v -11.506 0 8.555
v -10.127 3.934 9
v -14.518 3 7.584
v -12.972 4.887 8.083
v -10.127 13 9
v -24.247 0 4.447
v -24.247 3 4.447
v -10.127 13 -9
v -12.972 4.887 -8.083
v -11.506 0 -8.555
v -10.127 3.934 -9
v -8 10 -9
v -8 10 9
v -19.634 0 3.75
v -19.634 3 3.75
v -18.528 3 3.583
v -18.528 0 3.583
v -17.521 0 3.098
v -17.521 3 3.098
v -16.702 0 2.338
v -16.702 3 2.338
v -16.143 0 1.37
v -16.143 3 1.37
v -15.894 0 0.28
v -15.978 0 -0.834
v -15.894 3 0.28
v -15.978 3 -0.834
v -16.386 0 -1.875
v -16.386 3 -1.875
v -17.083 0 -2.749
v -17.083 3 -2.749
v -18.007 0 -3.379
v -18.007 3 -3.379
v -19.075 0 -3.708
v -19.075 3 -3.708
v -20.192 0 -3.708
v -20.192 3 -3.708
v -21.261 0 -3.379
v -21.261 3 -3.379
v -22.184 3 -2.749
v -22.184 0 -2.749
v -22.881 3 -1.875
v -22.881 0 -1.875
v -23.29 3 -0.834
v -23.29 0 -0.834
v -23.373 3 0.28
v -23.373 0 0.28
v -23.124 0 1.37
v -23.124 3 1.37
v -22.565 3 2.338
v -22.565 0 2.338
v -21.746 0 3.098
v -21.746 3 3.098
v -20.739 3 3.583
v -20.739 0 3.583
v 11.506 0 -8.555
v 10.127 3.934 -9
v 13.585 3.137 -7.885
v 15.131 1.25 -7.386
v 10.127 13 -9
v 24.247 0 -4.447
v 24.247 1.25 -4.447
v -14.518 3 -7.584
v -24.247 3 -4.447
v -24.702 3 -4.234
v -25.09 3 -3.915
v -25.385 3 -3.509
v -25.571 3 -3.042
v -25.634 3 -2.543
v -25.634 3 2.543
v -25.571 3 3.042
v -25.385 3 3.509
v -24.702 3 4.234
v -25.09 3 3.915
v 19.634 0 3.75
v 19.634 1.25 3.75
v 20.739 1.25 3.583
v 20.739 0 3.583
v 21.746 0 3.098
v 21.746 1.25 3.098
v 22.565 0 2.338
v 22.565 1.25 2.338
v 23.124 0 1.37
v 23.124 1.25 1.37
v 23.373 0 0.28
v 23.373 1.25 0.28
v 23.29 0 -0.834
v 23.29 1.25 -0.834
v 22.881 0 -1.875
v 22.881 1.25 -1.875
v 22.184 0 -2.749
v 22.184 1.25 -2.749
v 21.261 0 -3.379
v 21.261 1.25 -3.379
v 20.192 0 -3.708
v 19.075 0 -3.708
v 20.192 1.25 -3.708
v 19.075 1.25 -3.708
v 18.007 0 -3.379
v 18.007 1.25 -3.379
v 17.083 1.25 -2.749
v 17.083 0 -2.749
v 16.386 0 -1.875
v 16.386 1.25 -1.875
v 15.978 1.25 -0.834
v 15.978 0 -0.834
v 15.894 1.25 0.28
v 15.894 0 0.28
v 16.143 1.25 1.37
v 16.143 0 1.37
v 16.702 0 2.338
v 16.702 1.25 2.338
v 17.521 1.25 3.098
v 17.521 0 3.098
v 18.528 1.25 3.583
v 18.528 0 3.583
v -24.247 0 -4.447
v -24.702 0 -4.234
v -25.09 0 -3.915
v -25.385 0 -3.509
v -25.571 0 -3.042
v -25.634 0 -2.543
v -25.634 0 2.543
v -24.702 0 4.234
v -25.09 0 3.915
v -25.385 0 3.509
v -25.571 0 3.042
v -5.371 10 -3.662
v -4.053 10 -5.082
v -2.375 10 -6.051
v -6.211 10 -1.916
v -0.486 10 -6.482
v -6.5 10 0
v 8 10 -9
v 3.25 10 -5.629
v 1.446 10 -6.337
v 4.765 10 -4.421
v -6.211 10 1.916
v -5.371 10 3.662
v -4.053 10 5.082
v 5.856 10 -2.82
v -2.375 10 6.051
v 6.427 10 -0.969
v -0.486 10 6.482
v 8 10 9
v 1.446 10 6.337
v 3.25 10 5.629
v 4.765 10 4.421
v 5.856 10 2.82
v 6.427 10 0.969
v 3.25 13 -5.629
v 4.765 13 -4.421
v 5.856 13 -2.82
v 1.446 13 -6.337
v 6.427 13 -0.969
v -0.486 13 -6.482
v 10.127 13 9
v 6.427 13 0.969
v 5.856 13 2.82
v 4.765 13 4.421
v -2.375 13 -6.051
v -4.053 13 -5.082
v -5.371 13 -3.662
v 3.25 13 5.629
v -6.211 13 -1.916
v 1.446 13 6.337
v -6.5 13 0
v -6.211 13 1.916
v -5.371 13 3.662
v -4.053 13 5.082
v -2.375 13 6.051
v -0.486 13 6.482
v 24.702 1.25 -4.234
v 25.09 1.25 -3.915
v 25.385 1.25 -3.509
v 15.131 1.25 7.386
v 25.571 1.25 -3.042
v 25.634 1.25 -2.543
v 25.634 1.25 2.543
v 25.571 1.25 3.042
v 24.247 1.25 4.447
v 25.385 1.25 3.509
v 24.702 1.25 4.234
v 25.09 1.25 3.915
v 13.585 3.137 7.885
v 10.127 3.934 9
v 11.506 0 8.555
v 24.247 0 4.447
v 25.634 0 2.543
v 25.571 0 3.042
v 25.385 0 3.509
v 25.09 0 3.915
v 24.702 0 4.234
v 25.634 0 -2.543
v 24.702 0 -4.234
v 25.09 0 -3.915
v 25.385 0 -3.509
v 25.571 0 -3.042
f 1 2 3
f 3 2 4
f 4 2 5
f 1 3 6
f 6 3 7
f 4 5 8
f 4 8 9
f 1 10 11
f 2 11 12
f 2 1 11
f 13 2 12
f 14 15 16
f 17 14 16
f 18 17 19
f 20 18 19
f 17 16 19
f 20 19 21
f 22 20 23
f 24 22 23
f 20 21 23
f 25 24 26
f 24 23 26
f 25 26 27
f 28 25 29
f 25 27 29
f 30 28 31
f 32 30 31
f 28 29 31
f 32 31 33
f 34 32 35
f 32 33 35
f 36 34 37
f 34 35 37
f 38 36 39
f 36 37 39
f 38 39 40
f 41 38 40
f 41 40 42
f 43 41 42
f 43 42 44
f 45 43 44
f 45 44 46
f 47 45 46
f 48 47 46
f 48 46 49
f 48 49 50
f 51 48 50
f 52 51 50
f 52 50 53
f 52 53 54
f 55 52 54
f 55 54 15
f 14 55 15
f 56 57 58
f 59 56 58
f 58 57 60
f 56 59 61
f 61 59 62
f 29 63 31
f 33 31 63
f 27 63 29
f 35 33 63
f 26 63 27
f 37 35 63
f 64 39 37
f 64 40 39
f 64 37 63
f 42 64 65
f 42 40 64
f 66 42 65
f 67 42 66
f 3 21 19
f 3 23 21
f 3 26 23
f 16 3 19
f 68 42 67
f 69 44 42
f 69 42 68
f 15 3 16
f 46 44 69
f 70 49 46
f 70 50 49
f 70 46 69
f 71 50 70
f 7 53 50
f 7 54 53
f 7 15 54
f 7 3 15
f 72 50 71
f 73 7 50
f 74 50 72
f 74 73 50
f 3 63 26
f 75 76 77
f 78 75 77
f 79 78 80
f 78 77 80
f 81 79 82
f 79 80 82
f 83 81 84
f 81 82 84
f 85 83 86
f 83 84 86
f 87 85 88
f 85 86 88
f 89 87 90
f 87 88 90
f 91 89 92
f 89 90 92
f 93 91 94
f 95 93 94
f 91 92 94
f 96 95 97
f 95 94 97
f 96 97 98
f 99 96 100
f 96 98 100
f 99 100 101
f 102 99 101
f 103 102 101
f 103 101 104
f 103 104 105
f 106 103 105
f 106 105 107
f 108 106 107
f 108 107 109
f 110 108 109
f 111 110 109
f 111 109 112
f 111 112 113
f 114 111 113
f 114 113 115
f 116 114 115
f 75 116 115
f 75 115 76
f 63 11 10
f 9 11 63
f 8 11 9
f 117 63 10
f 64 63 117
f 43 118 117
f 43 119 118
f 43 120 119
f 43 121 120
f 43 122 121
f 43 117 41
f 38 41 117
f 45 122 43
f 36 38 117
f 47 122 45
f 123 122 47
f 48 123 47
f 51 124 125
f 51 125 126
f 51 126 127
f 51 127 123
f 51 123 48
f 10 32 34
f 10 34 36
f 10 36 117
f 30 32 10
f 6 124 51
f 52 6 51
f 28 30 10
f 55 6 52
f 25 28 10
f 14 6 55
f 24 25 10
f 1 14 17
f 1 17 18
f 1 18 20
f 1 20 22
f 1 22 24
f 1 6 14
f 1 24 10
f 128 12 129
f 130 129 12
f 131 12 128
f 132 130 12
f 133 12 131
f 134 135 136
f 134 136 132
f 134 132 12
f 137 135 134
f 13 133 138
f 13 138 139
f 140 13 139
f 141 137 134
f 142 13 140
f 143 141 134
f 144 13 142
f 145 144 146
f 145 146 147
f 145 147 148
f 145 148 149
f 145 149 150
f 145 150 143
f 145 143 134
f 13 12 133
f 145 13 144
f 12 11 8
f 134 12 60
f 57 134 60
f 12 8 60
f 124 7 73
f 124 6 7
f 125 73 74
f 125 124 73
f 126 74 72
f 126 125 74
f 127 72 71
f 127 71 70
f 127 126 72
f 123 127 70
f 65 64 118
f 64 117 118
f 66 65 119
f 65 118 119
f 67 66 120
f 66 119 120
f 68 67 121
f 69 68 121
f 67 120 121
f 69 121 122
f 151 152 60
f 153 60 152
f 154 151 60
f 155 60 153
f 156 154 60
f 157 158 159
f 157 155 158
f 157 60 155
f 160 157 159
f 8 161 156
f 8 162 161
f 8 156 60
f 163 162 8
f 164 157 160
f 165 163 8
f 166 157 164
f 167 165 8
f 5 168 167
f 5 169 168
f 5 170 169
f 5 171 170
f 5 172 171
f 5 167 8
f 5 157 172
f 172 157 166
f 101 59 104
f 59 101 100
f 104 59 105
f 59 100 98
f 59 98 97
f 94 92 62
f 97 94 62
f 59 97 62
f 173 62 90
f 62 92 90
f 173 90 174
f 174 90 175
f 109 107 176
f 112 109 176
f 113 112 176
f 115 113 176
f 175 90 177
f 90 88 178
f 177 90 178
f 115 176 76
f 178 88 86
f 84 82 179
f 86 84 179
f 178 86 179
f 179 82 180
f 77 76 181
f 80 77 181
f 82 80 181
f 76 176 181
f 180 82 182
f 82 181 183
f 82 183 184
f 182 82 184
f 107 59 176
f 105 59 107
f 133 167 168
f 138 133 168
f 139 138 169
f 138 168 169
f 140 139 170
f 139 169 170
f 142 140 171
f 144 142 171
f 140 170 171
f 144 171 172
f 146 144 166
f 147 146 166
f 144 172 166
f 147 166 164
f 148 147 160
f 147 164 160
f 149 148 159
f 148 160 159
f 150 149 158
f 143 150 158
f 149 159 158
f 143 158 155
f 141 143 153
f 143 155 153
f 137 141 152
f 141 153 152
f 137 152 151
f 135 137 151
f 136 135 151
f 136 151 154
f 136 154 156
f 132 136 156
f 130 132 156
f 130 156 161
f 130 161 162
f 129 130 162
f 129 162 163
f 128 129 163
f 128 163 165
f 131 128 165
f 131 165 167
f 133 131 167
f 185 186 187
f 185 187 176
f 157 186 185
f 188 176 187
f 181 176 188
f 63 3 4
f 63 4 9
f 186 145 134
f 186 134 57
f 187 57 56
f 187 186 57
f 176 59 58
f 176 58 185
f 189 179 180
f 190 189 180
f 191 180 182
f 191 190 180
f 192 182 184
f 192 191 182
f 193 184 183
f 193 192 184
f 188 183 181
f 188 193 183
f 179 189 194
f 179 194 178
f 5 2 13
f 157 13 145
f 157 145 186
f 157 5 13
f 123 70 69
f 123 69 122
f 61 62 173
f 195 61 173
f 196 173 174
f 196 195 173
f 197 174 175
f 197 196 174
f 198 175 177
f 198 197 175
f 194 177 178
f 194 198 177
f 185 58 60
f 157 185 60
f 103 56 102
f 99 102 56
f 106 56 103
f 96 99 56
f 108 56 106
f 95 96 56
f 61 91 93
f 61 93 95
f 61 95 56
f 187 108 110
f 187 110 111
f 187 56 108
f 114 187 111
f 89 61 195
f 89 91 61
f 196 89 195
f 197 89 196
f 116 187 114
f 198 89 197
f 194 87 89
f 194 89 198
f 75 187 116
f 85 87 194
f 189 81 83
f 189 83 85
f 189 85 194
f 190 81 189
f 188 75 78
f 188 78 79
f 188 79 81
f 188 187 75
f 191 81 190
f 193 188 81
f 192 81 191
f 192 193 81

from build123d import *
from OCP.BRepFilletAPI import BRepFilletAPI_MakeChamfer

# Parameters (mm, degrees)
BOSS_EXTRUDE1_DEPTH = 9
CUT_EXTRUDE1_REACH  = 32.118
SKETCH2_R           = 6.5
CUT_EXTRUDE2_DEPTH  = 18
CUT_EXTRUDE3_REACH  = 30.95
SKETCH4_R           = 3.7499999999999996
CUT_EXTRUDE4_DEPTH  = 10
FILLET1_R           = 2
CHAMFER1_SIZE       = 2
CHAMFER1_SIZE2      = 0.8842438837908889
CHAMFER1_SIZE2_2    = 0.8842438837908887


with BuildPart() as part:
    # Sketch1 → Boss-Extrude1 (new, symmetric)
    with BuildSketch(Plane.XY):
        Polygon((-25.633576548445145, 1e-17), (-11.506423451554879, 4e-17), (-8, 10), (0, 9.999999999999993), (8, 9.999999999999993), (11.506423451554879, 4e-17), (25.633576548445145, 4e-17), (25.63357654844514, 3.000000000000001), (13.633576548445141, 3), (10.12715309689026, 13.000000000000002), (0, 12.999999999999995), (-10.127153096890261, 13.000000000000002), (-13.633576548445141, 3), (-25.633576548445145, 3), align=None)
    extrude(amount=BOSS_EXTRUDE1_DEPTH, both=True)

    # Sketch2 → Cut-Extrude1 (cut, up to next)
    with BuildSketch(Plane(origin=(8.91e-15, 12.999999999999995, 0), x_dir=(1, -7.1e-16, 0), z_dir=(7.1e-16, 1, 0)), mode=Mode.PRIVATE) as cut_extrude1_sk1:
        with Locations(Location((0, 0, 0), (0, 0, 180))):
            Circle(SKETCH2_R)
    cut_extrude1_tool1 = extrude(cut_extrude1_sk1.sketch, amount=-CUT_EXTRUDE1_REACH, mode=Mode.PRIVATE) & part.part
    add(cut_extrude1_tool1.solids().sort_by_distance((0, 13, 0))[0], mode=Mode.SUBTRACT)

    # Sketch3 → Cut-Extrude2 (cut)
    with BuildSketch(Plane(origin=(8.91e-15, 12.999999999999995, 0), x_dir=(1, -7.1e-16, 0), z_dir=(7.1e-16, 1, 0))):
        Polygon((-10.12715309689027, 9), (-25.63357654844515, 4), (-25.63357654844515, 9), align=None)
        Polygon((-10.12715309689025, -9), (-25.63357654844515, -4), (-25.63357654844515, -9), align=None)
        Polygon((25.63357654844515, 9), (10.12715309689025, 9), (25.63357654844515, 4), align=None)
        Polygon((25.63357654844515, -4), (25.63357654844515, -9), (10.12715309689025, -9), align=None)
    extrude(amount=-CUT_EXTRUDE2_DEPTH, mode=Mode.SUBTRACT)

    # Sketch4 → Cut-Extrude3 (cut, up to next)
    with BuildSketch(Plane(origin=(0, 3, 0), x_dir=(1, 0, 0), z_dir=(0, 1, 0)), mode=Mode.PRIVATE) as cut_extrude3_sk1:
        with Locations(Location((-19.633576548445145, -2.4e-15, 0), (0, 0, 270))):
            Circle(SKETCH4_R)
    cut_extrude3_tool1 = extrude(cut_extrude3_sk1.sketch, amount=-CUT_EXTRUDE3_REACH, mode=Mode.PRIVATE) & part.part
    # Sketch4 → Cut-Extrude3 (cut, up to next)
    with BuildSketch(Plane(origin=(0, 3, 0), x_dir=(1, 0, 0), z_dir=(0, 1, 0)), mode=Mode.PRIVATE) as cut_extrude3_sk2:
        with Locations(Location((19.63357654844515, 2.4e-15, 0), (0, 0, 270))):
            Circle(SKETCH4_R)
    cut_extrude3_tool2 = extrude(cut_extrude3_sk2.sketch, amount=-CUT_EXTRUDE3_REACH, mode=Mode.PRIVATE) & part.part
    add(cut_extrude3_tool1.solids().sort_by_distance((-19.633577, 3, 0))[0], mode=Mode.SUBTRACT)
    add(cut_extrude3_tool2.solids().sort_by_distance((19.633577, 3, 0))[0], mode=Mode.SUBTRACT)

    # Sketch5 → Cut-Extrude4 (cut, symmetric)
    with BuildSketch(Plane.XY):
        Polygon((13.633576548445141, 3), (14.247200652467244, 1.2500000000000009), (25.63357654844515, 1.2500000000000009), (25.633576548445152, 3.000000000000001), align=None)
    extrude(amount=CUT_EXTRUDE4_DEPTH, both=True, mode=Mode.SUBTRACT)

    # Fillet1
    fillet1_edges = [part.edges().sort_by_distance(p)[0] for p in [
        (25.633576548445152, 0.6250000000000018, 4),
        (-25.633576548445145, 1.5, -4),
        (-25.633576548445145, 1.5, 4),
        (25.633576548445152, 0.6250000000000018, -4),
    ]]
    fillet(fillet1_edges, radius=FILLET1_R)

    # Chamfer1: one chamfer whose edges measure the first distance from different faces: ONE call of the kernel's chamfer builder (chamfer() names one face for all edges)
    chamfer1_edges_1 = [part.edges().sort_by_distance(p)[0] for p in [
        (14.247200652467244, 1.2500000000000009, 0),
    ]]
    chamfer1_side_1 = [part.faces().sort_by_distance(p)[0] for p in [
        (12.132458042687091, 7.281053120074241, 1.1e-16),
    ]]
    chamfer1_edges_2 = [part.edges().sort_by_distance(p)[0] for p in [
        (-13.633576548445141, 3, -3.55e-15),
    ]]
    chamfer1_side_2 = [part.faces().sort_by_distance(p)[0] for p in [
        (-11.841196306073245, 8.111705038297892, -3.84e-15),
    ]]
    chamfer1 = BRepFilletAPI_MakeChamfer(part.part.solid().wrapped)
    for e in chamfer1_edges_1:
        chamfer1.Add(CHAMFER1_SIZE, CHAMFER1_SIZE2, e.wrapped, chamfer1_side_1[0].wrapped)  # the first distance lies on this face
    for e in chamfer1_edges_2:
        chamfer1.Add(CHAMFER1_SIZE, CHAMFER1_SIZE2_2, e.wrapped, chamfer1_side_2[0].wrapped)  # the first distance lies on this face
    add(Compound.cast(chamfer1.Shape()), mode=Mode.REPLACE)


solid = part.part
